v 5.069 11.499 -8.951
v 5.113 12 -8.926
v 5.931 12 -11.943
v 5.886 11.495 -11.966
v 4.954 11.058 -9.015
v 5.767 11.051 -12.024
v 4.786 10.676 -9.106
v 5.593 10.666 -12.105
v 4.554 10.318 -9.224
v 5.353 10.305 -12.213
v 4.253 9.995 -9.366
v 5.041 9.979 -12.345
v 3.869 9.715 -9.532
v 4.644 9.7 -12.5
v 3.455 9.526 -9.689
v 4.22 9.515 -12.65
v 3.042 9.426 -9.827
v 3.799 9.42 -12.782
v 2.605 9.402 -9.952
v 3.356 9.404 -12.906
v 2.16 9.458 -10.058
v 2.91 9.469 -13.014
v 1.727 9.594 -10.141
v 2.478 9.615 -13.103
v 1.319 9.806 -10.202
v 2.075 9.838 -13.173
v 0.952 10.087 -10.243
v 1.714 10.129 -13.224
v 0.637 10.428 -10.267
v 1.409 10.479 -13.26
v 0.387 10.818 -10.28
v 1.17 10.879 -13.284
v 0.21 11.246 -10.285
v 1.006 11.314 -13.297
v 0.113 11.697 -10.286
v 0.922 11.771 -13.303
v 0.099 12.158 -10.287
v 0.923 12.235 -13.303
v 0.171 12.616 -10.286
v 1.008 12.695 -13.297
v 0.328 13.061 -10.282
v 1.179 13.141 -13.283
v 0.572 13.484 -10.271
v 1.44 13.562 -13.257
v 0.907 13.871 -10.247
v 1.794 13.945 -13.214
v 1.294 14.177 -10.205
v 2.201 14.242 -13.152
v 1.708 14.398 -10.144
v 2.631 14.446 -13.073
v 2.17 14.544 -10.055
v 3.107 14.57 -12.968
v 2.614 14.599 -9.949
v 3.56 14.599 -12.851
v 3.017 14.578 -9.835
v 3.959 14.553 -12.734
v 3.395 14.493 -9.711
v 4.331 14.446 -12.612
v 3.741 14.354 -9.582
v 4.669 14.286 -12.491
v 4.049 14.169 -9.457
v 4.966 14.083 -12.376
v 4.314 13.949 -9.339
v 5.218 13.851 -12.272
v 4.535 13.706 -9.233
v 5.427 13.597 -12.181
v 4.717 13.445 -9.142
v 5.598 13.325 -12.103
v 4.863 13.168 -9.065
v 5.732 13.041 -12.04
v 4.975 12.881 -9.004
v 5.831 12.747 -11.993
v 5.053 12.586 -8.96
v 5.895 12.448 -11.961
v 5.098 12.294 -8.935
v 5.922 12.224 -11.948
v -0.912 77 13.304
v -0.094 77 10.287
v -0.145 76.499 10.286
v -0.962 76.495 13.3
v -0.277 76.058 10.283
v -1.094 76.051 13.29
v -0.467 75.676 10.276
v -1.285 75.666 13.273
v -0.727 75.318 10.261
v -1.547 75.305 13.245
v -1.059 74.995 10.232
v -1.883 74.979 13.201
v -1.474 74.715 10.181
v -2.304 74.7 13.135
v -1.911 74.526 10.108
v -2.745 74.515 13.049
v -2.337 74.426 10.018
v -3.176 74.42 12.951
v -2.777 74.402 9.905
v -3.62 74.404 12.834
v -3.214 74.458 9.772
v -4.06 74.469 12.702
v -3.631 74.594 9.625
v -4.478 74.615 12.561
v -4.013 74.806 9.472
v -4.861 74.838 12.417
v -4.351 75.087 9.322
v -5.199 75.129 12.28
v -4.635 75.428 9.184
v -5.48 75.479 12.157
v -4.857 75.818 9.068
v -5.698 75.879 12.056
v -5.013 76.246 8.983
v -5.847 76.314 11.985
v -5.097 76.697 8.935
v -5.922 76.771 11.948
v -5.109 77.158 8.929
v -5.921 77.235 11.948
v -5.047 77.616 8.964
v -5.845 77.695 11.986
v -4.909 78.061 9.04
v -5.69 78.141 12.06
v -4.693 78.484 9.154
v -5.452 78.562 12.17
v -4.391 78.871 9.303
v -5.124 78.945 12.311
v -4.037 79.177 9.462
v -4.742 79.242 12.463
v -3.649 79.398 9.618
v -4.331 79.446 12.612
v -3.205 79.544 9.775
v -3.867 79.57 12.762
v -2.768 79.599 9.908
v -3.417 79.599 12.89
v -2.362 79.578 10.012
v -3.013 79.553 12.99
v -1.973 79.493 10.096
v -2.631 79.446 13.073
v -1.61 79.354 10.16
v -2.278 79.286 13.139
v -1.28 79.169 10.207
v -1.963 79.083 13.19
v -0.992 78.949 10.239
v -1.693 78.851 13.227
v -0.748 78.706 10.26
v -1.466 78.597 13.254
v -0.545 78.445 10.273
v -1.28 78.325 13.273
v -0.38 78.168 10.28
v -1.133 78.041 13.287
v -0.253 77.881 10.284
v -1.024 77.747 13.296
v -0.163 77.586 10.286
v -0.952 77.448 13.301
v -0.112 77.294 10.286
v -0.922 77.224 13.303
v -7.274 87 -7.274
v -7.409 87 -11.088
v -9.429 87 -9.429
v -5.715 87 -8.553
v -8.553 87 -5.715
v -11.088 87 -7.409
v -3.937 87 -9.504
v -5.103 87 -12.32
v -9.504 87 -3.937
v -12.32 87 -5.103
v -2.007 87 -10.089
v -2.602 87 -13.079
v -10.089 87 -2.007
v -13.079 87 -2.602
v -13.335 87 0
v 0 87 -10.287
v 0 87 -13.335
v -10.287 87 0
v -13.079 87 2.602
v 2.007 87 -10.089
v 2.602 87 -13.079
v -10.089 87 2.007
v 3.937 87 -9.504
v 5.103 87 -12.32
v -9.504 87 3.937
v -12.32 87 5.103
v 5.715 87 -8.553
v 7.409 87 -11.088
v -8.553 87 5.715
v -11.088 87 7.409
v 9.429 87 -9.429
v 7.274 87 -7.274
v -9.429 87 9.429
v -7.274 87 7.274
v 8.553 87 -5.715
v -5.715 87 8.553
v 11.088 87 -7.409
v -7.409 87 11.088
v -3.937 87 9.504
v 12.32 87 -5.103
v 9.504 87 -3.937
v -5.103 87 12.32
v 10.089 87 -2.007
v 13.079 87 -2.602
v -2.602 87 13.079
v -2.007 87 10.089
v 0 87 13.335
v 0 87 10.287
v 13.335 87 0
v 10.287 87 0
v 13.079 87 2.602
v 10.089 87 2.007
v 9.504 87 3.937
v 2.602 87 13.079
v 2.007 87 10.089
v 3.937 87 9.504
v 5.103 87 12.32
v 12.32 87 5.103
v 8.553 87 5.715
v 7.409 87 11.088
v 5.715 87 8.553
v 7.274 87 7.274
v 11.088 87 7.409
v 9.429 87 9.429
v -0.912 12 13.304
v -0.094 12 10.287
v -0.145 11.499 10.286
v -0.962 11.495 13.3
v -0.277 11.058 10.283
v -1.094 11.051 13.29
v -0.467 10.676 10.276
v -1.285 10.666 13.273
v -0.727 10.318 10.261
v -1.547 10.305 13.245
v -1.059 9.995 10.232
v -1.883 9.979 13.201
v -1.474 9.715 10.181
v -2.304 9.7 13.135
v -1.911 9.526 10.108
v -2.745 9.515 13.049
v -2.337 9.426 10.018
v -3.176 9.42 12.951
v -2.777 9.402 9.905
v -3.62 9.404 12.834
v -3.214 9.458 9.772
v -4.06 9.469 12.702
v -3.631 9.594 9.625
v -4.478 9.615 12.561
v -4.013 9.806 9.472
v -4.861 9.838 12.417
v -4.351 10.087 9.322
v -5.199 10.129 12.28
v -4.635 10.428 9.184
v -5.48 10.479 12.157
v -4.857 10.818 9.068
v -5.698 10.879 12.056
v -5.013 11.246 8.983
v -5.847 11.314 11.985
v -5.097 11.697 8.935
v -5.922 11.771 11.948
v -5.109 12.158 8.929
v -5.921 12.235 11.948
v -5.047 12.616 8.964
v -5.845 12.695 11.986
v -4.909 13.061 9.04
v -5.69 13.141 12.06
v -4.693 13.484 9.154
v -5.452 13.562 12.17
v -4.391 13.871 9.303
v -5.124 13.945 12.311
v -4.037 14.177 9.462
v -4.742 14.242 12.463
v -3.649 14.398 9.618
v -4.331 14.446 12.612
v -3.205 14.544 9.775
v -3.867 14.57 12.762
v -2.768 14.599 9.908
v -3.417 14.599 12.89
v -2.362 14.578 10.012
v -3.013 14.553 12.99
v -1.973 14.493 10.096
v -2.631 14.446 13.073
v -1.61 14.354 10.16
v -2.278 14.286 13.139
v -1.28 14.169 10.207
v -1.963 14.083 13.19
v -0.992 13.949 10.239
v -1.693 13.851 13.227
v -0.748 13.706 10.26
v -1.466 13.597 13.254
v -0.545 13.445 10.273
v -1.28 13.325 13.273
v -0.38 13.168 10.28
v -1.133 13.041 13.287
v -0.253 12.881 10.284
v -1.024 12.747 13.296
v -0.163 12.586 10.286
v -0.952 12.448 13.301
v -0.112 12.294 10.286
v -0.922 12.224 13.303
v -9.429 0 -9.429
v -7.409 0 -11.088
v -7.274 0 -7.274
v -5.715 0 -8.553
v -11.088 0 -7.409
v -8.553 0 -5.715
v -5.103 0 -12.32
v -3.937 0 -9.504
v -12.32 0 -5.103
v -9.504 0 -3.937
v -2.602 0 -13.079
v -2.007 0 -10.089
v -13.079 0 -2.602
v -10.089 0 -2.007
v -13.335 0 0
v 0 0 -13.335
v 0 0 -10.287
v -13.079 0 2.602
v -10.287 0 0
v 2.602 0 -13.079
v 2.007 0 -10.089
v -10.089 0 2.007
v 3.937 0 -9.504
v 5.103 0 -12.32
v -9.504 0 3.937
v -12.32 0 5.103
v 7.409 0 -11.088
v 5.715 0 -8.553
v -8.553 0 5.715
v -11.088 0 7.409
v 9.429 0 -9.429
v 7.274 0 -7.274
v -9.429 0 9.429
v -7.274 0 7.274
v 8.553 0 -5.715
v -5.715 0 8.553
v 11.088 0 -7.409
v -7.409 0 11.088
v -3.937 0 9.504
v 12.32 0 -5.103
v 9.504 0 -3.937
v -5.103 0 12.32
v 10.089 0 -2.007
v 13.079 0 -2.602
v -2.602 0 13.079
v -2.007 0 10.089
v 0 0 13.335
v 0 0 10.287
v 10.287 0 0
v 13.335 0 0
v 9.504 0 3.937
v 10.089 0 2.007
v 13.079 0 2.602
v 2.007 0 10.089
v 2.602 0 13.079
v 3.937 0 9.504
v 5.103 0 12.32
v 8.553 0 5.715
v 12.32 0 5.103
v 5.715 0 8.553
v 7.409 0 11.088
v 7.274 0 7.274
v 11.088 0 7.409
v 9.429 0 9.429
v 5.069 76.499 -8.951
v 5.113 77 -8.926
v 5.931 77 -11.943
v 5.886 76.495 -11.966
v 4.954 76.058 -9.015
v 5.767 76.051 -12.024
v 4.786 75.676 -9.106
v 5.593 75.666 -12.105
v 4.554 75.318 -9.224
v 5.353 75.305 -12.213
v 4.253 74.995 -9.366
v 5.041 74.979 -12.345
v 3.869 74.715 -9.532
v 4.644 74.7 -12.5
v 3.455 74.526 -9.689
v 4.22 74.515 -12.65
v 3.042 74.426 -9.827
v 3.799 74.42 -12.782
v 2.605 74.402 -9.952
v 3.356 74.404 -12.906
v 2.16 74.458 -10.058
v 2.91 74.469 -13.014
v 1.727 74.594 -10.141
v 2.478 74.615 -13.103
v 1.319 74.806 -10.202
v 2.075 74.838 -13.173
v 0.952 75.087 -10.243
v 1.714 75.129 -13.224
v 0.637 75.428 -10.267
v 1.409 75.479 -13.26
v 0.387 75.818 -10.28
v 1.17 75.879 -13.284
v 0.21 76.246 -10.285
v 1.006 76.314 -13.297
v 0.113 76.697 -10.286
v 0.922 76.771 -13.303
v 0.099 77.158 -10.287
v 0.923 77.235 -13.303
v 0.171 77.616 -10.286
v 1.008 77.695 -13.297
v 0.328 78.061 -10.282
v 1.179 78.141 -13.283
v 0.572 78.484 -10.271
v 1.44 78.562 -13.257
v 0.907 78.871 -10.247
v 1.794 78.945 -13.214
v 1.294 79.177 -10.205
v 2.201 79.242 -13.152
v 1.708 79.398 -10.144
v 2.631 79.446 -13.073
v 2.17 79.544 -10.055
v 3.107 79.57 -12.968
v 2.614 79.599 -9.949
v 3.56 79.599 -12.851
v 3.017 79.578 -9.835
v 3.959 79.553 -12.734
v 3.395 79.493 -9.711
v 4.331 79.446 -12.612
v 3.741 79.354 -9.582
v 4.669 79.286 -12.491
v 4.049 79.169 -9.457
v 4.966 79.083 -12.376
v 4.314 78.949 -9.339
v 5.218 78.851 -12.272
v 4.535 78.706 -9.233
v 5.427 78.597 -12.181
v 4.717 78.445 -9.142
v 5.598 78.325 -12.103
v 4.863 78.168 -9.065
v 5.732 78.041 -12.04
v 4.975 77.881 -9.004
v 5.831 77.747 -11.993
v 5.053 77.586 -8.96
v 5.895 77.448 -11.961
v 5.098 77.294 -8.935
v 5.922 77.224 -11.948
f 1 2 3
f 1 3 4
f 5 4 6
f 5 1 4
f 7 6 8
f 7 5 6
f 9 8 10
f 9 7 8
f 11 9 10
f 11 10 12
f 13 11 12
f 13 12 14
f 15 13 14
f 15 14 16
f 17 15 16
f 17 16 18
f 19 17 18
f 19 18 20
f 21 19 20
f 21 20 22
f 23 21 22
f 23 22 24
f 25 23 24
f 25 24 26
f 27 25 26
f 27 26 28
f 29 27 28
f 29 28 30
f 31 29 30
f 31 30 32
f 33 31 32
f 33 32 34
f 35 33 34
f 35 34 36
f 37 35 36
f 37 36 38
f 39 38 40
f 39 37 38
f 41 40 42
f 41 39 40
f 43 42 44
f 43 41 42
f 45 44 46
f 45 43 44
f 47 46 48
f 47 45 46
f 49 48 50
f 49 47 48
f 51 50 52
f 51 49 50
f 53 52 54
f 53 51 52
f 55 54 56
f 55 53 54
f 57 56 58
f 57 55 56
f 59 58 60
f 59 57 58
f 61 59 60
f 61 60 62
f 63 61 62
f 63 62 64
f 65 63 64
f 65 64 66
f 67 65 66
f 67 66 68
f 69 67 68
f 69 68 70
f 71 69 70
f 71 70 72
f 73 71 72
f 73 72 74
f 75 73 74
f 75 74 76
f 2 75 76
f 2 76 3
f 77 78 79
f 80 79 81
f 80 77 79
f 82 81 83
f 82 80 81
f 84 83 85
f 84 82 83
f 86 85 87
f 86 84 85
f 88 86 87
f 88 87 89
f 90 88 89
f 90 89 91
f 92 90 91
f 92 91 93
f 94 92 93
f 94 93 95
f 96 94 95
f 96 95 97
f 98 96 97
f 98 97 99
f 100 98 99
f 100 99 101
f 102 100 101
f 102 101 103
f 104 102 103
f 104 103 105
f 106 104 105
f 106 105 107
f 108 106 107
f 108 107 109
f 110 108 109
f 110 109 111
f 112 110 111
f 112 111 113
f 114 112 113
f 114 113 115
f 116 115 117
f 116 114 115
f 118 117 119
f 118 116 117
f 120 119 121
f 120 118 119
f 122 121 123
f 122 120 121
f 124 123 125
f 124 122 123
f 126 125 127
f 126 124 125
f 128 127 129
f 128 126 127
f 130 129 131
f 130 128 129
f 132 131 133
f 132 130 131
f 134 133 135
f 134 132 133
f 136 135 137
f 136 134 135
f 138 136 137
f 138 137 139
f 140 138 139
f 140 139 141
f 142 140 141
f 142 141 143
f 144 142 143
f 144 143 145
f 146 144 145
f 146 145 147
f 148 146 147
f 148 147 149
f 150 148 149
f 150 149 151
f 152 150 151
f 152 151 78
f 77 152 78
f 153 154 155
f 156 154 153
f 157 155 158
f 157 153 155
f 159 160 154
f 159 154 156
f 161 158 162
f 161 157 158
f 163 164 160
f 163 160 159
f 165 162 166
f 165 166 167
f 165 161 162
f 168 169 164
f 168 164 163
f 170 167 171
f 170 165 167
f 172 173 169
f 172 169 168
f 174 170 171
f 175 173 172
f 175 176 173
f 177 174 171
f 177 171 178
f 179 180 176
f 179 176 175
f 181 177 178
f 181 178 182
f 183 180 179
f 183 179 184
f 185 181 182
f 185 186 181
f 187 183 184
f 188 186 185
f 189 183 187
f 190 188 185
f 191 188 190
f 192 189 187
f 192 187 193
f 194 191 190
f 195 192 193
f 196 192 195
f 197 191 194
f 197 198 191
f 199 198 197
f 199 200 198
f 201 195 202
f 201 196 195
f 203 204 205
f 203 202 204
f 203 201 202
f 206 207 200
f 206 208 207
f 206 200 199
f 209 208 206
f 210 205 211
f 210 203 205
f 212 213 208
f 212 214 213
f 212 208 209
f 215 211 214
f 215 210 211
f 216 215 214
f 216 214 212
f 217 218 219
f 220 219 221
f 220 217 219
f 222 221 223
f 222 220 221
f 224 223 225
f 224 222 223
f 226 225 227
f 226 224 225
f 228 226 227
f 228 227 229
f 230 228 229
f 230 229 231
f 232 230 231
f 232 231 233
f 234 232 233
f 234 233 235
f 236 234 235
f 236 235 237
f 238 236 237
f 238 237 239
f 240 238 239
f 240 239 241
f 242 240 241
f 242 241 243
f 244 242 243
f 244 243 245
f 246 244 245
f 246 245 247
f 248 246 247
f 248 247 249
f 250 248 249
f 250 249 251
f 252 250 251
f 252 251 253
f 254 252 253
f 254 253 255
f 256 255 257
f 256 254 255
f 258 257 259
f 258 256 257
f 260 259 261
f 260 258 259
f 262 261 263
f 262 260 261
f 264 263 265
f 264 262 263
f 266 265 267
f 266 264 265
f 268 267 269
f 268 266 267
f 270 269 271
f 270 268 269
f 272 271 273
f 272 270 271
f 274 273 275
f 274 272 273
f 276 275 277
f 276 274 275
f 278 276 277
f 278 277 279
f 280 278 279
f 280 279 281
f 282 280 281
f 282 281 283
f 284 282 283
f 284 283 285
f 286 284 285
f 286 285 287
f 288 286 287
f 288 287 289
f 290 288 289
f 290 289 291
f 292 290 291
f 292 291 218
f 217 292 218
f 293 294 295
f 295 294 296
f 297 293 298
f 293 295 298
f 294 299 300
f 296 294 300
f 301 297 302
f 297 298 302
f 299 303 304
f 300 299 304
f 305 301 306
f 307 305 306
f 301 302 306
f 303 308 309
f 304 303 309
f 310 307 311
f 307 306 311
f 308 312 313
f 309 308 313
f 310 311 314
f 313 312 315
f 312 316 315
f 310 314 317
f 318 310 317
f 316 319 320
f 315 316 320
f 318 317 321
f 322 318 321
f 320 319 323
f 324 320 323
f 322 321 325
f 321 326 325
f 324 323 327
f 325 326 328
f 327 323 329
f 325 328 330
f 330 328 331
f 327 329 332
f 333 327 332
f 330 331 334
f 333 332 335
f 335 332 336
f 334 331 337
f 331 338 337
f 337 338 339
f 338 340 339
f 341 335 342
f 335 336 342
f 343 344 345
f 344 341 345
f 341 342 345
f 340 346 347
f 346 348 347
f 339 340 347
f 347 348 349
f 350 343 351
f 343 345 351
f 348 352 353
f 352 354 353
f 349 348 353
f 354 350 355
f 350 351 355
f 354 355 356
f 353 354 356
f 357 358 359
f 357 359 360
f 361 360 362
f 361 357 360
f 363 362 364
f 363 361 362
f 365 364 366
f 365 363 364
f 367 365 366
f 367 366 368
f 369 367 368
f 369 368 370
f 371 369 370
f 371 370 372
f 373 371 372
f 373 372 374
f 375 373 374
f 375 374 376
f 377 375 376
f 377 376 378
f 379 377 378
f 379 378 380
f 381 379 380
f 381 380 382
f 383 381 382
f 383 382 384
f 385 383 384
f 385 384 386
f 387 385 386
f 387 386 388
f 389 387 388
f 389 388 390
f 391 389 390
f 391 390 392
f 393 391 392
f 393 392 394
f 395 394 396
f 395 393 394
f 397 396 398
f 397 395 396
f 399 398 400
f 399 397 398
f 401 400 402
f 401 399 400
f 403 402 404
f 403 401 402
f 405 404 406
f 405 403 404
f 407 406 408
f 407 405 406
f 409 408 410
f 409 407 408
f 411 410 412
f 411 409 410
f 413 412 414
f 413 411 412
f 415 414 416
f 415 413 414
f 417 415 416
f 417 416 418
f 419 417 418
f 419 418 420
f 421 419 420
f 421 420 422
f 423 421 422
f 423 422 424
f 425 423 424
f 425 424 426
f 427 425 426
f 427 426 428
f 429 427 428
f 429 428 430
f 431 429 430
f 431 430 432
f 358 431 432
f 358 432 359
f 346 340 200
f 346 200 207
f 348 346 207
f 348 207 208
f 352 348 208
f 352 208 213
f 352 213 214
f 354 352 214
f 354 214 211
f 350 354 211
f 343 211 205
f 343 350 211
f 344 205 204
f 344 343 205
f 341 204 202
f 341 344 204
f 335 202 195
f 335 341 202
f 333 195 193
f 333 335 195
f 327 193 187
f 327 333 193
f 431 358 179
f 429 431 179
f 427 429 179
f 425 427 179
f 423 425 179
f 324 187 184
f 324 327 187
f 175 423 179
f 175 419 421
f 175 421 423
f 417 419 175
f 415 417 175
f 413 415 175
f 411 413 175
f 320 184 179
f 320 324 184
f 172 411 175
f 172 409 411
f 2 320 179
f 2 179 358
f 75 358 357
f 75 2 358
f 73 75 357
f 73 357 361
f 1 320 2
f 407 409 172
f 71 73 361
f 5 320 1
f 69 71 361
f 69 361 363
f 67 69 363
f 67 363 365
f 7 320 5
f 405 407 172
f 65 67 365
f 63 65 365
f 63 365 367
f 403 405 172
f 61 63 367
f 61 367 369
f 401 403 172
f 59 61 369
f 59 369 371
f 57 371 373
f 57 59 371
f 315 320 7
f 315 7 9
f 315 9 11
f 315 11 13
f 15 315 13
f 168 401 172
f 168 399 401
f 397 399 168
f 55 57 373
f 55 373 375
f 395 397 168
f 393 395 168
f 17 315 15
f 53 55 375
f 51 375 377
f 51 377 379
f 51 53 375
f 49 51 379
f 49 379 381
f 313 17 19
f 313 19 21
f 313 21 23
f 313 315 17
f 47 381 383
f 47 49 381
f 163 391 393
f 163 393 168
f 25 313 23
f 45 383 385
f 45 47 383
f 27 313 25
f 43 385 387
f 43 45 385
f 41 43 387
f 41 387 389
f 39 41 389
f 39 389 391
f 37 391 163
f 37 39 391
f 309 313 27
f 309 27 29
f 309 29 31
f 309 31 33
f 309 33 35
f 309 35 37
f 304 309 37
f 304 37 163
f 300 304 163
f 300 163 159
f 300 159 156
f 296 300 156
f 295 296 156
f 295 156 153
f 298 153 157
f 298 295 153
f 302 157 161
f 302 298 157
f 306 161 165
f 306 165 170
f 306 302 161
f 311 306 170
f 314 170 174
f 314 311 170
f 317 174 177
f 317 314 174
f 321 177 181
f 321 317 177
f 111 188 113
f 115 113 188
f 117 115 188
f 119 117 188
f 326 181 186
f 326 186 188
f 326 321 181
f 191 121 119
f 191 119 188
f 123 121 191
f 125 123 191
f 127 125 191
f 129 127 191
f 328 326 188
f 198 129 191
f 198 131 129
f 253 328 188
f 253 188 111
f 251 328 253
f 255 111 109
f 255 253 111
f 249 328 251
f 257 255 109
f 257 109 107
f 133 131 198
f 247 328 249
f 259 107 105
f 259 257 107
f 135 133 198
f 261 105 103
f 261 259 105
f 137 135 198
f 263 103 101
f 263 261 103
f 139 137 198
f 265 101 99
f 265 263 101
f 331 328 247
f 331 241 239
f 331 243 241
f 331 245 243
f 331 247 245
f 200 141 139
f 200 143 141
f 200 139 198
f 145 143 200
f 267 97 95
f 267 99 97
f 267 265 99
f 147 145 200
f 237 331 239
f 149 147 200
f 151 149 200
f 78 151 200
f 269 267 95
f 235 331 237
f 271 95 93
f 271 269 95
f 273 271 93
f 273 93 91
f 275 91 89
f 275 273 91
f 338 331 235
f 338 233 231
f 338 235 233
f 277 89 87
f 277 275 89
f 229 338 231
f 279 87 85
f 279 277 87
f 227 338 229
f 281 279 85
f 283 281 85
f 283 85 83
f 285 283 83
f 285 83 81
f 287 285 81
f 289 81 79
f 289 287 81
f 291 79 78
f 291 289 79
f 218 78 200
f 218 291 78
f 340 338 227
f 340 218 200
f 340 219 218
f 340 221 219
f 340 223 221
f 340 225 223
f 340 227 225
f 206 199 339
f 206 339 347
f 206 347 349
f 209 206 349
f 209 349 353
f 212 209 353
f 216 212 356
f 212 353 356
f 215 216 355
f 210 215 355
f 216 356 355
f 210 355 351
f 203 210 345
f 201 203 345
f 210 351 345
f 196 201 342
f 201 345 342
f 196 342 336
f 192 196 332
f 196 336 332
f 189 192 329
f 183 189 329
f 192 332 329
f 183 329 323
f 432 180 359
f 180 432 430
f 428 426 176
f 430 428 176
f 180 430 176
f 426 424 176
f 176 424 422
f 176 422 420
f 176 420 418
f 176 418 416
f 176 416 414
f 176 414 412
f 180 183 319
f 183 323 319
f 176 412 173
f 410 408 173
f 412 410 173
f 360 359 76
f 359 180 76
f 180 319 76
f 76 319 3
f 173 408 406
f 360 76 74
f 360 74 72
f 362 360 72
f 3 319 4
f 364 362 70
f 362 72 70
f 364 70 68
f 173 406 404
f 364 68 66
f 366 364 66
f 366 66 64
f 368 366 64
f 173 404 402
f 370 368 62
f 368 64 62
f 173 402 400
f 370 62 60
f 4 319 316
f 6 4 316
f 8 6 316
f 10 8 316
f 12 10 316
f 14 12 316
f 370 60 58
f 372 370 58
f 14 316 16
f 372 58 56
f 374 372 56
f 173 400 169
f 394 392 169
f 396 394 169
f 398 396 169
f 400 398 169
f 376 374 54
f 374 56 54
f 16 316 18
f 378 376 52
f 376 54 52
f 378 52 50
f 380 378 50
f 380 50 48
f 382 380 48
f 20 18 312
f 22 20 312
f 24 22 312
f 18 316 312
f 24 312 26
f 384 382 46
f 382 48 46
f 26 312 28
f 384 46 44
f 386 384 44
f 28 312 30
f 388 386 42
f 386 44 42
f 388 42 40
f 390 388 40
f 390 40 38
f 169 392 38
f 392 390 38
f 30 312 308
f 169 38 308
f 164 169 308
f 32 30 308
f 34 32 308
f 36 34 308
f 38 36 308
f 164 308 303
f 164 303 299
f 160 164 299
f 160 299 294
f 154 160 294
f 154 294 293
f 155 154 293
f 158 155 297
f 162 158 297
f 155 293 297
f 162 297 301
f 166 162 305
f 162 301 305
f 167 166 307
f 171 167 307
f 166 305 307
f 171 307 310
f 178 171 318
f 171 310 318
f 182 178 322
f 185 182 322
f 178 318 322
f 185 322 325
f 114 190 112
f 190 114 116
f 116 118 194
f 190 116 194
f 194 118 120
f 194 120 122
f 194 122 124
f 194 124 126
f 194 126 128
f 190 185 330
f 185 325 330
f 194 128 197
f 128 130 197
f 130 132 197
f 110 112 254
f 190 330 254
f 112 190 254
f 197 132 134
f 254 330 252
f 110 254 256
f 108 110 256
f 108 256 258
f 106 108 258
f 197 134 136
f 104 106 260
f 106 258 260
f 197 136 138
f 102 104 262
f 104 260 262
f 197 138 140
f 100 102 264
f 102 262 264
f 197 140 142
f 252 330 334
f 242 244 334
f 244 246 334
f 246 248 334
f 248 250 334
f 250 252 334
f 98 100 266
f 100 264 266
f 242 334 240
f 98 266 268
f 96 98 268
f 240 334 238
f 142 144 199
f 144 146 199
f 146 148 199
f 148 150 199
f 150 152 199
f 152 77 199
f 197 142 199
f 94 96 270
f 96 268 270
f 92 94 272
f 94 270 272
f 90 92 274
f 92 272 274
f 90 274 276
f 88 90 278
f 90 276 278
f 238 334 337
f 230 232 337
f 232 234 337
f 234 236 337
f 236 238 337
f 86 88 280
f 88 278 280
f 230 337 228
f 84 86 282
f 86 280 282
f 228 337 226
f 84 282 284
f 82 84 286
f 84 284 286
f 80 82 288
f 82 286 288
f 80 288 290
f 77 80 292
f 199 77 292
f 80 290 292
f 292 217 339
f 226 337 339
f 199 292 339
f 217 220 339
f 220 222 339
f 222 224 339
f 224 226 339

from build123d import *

# Parameters (mm, degrees)
SKETCH2_R               = 13.335
SKETCH2_R_2             = 10.287
BOSS_EXTRUDE2_DEPTH     = 87
CUT_EXTRUDE1_DEPTH      = 20
CUT_EXTRUDE1_DEPTH_BACK = 20
SKETCH4_R               = 2.6


with BuildPart() as part:
    # Sketch2 → Boss-Extrude2 (new body)
    with BuildSketch(Plane(origin=(0, 0, 0), x_dir=(1, 0, 0), z_dir=(0, 1, 0))):
        Circle(SKETCH2_R)
        Circle(SKETCH2_R_2, mode=Mode.SUBTRACT)
    extrude(amount=BOSS_EXTRUDE2_DEPTH)

    # Sketch4 → Cut-Extrude1 (cut, two sides: drawn at the far end of the back side and taken through both)
    with BuildSketch(Plane(origin=(-1275.101492903, -824.70990816, -345.604288183), x_dir=(-0.965175873824897, 0, -0.2616018589122535), z_dir=(0.2616018589122535, 2.2232920799531116e-15, -0.965175873824897)).offset(-CUT_EXTRUDE1_DEPTH_BACK)):
        with Locations((-1321.107921864, 901.70990816)):
            Circle(SKETCH4_R)
        with Locations((-1321.107921864, 836.70990816)):
            Circle(SKETCH4_R)
    extrude(amount=CUT_EXTRUDE1_DEPTH + CUT_EXTRUDE1_DEPTH_BACK, mode=Mode.SUBTRACT)


solid = part.part
